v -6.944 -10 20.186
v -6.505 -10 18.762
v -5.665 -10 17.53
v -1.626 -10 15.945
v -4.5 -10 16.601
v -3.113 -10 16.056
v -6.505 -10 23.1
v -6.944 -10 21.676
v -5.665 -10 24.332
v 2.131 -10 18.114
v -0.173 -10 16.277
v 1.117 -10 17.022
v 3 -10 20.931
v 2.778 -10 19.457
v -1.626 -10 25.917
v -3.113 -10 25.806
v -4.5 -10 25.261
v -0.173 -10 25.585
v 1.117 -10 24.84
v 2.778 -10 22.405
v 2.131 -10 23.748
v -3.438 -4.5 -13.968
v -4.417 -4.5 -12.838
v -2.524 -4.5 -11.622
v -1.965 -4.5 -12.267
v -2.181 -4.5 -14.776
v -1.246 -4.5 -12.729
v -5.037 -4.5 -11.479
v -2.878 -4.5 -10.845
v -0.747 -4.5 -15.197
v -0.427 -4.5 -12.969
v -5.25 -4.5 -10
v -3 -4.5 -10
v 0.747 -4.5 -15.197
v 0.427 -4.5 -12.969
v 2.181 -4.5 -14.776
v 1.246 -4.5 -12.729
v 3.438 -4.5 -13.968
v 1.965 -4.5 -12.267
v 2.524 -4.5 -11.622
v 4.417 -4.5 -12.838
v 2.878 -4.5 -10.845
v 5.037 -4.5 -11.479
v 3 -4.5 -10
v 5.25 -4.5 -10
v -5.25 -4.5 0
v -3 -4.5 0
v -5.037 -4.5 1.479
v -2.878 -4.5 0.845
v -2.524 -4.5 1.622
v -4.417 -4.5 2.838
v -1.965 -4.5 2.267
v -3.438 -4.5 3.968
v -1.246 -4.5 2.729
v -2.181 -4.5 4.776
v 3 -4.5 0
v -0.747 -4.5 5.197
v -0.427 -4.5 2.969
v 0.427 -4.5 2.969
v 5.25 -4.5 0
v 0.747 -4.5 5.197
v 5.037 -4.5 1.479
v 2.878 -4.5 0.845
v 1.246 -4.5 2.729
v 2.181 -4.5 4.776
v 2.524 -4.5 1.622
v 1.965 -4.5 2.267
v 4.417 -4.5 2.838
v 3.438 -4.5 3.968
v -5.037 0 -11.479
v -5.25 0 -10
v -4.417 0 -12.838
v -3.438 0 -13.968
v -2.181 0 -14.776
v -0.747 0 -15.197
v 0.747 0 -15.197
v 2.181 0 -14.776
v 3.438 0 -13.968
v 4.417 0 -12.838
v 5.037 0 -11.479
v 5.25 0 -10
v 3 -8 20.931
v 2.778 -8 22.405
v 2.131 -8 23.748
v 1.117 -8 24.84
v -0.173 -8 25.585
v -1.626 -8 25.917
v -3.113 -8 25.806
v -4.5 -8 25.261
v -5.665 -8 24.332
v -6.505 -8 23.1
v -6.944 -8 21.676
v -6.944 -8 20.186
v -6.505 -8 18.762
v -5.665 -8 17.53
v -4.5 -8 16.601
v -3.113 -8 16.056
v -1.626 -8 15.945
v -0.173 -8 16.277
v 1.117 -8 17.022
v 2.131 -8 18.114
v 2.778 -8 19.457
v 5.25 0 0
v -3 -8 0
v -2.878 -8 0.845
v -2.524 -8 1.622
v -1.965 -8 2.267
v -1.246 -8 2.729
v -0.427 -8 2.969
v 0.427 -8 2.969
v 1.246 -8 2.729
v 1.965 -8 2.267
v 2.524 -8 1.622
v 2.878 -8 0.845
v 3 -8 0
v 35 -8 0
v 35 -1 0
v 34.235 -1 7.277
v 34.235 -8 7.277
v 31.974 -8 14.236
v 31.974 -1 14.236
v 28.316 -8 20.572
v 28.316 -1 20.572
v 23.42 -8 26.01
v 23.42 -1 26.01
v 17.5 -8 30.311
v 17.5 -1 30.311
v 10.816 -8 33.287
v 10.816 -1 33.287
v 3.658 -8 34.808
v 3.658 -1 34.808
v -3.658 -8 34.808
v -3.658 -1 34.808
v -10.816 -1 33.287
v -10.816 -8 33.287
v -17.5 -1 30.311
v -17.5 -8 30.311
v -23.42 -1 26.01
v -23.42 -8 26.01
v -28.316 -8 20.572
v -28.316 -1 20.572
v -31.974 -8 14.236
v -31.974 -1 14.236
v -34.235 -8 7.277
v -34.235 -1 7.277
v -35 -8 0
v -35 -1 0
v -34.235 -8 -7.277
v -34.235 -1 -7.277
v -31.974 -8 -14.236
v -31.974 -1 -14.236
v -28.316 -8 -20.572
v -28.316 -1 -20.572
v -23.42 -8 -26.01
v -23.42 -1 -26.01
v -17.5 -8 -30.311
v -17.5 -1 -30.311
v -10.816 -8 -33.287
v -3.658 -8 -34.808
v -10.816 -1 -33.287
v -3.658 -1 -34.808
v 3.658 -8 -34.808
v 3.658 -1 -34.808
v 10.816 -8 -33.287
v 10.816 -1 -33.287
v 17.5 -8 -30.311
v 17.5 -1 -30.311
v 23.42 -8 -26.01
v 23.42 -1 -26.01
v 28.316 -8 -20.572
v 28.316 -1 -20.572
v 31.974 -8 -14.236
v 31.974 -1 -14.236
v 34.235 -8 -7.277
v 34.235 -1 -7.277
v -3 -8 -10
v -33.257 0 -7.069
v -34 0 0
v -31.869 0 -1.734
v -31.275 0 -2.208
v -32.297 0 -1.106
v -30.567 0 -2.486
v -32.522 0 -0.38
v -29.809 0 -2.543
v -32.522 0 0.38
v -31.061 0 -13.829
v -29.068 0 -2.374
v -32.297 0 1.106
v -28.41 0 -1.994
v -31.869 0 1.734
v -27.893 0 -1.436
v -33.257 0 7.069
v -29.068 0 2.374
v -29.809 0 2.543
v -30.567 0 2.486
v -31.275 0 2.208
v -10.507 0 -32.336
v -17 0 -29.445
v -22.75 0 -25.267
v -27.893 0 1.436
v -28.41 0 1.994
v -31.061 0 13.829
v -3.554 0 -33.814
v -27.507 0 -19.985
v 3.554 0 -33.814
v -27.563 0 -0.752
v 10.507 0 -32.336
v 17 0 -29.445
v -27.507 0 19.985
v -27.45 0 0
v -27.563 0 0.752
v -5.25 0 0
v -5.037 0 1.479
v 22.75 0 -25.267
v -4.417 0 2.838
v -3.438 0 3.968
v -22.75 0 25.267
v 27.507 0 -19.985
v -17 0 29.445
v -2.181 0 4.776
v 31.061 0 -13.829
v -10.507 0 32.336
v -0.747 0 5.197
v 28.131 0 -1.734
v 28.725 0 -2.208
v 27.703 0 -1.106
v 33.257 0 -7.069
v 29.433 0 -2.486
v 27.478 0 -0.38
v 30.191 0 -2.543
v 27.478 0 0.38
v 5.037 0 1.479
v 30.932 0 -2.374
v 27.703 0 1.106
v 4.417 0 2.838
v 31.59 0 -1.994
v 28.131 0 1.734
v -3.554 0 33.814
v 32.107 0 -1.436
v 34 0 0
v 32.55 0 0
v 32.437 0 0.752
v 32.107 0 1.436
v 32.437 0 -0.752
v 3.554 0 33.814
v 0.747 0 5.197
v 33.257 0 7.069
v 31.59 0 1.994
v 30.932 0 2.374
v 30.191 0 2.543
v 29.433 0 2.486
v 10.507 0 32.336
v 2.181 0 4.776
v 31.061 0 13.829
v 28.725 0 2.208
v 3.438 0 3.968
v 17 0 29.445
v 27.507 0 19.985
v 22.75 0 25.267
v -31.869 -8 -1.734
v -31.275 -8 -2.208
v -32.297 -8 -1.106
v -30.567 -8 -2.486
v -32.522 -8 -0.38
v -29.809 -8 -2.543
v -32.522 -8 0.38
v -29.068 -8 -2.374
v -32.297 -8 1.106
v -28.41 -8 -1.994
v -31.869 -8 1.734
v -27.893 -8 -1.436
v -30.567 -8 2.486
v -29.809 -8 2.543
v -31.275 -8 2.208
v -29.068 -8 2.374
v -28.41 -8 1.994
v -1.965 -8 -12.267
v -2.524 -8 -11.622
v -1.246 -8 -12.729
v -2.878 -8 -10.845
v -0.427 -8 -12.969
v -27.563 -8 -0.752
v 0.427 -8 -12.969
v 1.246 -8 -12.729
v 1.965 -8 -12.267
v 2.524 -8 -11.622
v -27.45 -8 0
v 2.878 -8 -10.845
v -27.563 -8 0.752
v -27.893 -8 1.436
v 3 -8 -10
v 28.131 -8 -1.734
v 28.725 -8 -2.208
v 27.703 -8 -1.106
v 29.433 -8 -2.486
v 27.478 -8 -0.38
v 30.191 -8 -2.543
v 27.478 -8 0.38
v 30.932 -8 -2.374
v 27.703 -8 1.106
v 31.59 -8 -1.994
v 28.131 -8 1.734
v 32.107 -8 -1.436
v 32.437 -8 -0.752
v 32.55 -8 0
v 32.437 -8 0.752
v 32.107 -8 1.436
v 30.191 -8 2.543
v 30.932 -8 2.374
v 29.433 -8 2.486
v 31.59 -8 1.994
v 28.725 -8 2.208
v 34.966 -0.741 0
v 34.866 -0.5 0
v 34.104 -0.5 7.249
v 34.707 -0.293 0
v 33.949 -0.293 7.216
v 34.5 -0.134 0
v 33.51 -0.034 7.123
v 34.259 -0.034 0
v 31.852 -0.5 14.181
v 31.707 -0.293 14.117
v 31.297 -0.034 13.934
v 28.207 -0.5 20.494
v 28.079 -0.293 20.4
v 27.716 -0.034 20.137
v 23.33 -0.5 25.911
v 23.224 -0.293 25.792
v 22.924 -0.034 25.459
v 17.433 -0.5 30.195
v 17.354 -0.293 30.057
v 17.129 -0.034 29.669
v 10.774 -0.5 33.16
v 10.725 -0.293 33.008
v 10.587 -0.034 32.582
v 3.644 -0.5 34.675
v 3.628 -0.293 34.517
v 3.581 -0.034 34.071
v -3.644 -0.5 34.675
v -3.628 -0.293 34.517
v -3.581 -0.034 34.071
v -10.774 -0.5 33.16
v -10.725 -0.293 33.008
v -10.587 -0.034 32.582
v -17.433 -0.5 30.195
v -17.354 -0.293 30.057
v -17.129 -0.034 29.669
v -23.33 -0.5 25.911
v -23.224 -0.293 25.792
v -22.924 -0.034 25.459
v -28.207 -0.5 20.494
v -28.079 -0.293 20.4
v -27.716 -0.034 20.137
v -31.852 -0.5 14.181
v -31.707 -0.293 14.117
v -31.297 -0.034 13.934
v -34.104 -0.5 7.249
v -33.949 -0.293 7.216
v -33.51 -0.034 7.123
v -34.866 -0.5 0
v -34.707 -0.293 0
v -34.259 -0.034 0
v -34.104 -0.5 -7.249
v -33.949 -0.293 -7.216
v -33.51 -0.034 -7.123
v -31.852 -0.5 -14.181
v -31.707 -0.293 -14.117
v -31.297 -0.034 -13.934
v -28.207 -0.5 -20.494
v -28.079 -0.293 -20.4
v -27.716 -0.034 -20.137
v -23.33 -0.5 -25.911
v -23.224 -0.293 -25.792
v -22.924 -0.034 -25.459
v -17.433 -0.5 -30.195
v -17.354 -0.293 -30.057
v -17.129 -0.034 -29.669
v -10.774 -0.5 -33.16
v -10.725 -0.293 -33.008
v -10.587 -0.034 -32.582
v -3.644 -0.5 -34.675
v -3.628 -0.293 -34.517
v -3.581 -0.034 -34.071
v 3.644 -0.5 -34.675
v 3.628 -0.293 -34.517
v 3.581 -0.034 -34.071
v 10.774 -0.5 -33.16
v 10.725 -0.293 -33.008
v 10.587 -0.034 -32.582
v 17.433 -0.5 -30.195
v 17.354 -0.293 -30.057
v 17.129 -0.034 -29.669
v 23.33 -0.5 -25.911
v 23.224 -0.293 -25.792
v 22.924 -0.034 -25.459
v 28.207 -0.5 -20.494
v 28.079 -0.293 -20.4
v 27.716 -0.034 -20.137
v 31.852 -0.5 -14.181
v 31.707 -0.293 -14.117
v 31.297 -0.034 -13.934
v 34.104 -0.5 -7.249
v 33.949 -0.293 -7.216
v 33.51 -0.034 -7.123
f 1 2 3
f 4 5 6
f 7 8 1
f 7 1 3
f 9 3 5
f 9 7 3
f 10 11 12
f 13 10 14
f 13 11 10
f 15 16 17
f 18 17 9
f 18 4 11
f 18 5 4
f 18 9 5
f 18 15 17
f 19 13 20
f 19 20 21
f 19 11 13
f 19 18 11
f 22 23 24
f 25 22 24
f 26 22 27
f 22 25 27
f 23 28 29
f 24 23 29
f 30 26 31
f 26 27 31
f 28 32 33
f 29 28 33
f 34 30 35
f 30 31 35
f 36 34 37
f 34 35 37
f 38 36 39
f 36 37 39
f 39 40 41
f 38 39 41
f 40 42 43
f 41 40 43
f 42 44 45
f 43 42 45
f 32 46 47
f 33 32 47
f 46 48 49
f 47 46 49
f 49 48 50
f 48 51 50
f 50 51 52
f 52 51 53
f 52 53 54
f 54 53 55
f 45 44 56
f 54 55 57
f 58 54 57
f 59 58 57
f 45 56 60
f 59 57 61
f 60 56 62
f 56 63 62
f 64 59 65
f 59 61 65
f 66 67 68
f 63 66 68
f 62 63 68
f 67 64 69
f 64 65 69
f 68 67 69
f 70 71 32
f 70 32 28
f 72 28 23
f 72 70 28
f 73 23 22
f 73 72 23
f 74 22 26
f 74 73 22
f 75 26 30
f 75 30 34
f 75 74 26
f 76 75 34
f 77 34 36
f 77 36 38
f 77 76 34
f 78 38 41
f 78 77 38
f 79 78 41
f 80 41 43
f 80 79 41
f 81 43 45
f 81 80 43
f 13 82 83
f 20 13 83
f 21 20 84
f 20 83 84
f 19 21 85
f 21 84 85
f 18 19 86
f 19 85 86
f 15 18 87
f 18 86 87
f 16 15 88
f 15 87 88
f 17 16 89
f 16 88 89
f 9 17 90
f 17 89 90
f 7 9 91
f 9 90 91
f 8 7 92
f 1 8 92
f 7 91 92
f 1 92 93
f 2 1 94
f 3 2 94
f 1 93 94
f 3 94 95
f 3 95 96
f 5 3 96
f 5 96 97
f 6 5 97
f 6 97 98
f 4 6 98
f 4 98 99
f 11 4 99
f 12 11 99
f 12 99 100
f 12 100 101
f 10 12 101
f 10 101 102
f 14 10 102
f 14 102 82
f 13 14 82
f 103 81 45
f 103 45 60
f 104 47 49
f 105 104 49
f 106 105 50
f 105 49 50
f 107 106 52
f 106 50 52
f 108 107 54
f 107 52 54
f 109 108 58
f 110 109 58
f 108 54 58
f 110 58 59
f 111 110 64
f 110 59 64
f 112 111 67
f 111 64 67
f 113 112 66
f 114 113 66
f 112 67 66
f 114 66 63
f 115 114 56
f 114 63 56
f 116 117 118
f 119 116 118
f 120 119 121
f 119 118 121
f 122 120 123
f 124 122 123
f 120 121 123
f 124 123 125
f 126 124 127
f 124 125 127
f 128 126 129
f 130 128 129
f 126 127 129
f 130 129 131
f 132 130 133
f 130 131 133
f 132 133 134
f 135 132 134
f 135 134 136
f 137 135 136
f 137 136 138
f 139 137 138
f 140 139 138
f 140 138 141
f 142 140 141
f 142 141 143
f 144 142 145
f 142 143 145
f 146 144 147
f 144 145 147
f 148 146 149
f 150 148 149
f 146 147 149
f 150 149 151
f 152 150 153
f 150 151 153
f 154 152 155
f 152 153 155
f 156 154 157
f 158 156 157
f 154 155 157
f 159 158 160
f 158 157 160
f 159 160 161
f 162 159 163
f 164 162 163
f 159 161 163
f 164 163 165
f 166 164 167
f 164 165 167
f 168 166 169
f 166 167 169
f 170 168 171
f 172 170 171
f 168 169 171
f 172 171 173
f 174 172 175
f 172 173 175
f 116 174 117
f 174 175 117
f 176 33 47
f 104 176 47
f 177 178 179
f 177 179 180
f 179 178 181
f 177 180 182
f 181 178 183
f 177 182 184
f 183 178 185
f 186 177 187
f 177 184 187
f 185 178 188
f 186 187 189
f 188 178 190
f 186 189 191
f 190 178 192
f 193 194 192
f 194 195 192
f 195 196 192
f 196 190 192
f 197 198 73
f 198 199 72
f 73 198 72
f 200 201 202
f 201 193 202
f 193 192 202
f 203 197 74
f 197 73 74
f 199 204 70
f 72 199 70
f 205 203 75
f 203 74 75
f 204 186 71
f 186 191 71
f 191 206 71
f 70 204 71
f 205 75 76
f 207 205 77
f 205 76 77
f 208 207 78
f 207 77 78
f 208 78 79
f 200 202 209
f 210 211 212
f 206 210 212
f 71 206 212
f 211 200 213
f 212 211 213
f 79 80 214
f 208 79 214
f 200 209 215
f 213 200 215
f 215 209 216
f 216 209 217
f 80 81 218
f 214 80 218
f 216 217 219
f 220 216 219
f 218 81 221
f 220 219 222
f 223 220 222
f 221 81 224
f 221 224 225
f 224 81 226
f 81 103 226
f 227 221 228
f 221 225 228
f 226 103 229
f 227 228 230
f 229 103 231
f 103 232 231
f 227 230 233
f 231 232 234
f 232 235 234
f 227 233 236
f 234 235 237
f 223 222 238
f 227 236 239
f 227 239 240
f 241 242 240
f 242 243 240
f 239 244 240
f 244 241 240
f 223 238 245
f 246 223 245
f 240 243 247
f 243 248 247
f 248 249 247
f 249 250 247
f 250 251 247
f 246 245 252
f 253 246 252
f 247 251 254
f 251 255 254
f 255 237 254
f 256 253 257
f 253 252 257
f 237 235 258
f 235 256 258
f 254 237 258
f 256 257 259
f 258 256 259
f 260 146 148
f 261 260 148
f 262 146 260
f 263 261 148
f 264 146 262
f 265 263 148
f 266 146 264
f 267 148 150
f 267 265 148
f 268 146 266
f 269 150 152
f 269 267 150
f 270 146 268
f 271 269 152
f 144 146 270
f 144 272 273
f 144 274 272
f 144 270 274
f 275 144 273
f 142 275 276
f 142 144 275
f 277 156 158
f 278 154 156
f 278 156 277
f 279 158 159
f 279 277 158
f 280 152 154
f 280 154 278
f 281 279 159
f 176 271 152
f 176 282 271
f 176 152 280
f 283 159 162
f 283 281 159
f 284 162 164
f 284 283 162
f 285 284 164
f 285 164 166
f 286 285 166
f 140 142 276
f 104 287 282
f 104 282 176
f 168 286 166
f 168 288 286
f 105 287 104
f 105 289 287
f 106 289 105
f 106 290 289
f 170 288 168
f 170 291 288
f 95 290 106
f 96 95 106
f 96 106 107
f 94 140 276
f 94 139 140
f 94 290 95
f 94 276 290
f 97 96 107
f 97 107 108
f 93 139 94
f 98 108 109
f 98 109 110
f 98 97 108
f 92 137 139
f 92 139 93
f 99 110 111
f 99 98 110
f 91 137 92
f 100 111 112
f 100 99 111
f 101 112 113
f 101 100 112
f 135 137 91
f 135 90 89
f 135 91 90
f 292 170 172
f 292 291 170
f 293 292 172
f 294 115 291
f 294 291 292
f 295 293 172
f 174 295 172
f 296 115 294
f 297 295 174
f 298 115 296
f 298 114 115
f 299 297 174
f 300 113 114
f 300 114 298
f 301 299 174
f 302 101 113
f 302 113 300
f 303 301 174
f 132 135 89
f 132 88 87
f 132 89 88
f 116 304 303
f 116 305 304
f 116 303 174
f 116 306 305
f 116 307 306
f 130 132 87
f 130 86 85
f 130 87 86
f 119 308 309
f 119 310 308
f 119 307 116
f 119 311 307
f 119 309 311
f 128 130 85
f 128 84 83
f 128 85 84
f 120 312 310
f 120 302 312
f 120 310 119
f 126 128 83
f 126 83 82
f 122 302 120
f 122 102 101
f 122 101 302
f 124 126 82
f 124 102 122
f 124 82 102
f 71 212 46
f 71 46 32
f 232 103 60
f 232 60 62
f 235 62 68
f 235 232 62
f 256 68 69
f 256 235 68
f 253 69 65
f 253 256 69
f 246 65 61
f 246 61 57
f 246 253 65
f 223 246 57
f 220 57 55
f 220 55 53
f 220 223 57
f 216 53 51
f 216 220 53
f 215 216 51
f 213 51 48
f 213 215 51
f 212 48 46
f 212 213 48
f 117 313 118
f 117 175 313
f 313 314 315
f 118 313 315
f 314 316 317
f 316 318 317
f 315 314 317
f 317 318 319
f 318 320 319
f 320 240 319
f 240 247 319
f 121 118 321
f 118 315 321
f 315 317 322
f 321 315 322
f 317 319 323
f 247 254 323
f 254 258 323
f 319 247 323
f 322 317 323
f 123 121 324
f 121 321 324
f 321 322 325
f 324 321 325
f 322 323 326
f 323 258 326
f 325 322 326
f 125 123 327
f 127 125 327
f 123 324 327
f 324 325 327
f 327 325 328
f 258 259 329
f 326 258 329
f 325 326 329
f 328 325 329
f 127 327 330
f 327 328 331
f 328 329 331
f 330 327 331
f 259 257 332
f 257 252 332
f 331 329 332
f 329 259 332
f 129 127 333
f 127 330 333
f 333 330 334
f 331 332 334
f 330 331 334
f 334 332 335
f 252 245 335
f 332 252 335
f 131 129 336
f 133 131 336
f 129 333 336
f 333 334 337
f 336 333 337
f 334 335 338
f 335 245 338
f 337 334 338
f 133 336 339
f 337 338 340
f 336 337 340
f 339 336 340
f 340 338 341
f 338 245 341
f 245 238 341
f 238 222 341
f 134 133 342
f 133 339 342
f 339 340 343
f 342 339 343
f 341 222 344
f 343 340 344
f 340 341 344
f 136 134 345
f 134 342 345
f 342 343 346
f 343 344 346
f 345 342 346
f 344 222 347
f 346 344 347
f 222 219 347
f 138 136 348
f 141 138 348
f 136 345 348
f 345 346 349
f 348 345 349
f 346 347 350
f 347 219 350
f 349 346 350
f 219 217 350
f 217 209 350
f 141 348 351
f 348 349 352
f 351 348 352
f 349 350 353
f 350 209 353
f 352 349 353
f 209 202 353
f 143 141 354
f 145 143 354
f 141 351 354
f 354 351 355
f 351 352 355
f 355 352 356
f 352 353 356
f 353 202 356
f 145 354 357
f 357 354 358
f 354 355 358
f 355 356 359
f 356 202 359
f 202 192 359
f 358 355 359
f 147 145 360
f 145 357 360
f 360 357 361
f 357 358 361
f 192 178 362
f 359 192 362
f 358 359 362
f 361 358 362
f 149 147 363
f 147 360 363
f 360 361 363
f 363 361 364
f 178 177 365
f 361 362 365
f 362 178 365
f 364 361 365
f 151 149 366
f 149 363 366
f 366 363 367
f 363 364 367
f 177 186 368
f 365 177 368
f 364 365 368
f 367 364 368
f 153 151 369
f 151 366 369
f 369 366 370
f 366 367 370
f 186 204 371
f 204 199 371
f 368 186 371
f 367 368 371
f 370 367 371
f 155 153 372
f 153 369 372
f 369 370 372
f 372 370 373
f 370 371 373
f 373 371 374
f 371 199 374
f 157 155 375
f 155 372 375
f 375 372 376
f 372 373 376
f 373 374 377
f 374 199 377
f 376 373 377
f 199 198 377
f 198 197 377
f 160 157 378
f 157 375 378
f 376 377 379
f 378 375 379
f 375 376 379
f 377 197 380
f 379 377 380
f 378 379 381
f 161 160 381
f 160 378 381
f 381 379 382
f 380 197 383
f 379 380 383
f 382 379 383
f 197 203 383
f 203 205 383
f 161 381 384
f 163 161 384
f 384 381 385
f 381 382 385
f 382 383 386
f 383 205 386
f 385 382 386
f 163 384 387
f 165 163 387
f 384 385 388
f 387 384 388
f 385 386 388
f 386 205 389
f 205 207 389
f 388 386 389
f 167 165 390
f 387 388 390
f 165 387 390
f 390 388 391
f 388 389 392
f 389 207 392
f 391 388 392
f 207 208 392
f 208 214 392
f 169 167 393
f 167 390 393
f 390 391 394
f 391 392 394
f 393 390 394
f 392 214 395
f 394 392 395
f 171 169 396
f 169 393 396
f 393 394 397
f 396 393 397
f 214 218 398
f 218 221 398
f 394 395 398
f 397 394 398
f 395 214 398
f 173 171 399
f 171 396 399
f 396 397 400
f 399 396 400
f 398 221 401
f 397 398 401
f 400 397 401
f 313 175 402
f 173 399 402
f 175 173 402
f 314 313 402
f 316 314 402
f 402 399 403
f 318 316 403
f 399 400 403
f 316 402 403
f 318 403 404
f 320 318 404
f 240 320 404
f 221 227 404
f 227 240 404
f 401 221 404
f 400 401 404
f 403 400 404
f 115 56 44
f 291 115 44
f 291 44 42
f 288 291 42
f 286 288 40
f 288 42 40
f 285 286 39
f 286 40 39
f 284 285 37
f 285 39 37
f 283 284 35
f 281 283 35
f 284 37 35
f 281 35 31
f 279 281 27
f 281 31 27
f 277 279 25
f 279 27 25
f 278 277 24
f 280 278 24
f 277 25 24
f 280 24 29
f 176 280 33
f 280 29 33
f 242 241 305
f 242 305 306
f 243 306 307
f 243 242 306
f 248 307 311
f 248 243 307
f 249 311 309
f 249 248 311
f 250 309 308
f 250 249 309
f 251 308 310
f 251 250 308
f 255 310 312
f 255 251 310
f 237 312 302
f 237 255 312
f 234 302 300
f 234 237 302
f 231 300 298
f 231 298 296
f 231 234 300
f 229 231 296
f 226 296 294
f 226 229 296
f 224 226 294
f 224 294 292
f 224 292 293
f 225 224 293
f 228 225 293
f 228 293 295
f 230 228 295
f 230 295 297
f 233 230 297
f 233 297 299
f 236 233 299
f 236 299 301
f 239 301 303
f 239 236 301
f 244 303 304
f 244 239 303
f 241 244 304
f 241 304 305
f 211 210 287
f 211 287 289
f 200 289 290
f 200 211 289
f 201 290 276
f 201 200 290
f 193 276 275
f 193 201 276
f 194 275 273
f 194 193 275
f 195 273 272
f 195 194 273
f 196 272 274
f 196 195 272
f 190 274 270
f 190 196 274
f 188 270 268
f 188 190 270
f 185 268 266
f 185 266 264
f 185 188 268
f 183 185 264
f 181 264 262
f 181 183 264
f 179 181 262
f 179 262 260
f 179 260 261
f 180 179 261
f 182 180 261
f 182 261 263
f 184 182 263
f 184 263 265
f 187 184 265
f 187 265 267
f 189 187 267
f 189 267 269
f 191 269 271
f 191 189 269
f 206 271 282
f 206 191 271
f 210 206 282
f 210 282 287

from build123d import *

# Parameters (mm, degrees)
F0_R     = 35
F0_R_2   = 2.55
F0_R_3   = 5
F1_DEPTH = 8
F2_DEPTH = 8
F3_DEPTH = 4.5
F4_R     = 1
F5_DEPTH = 10


with BuildPart() as f1:
    # F0 (on Front) → F1 (new body)
    with BuildSketch(Plane.XZ):
        Circle(F0_R)
        with BuildLine():
            ThreePointArc((-5.25, 0), (0, 5.25), (5.25, 0))
            Line((5.25, 0), (5.25, -10))
            ThreePointArc((5.25, -10), (0, -15.25), (-5.25, -10))
            Line((-5.25, -10), (-5.25, 0))
        make_face(mode=Mode.SUBTRACT)
        with Locations((-30, 0)):
            Circle(F0_R_2, mode=Mode.SUBTRACT)
        with Locations((-2, 20.93092)):
            Circle(F0_R_3, mode=Mode.SUBTRACT)
        with Locations((30, 0)):
            Circle(F0_R_2, mode=Mode.SUBTRACT)
    extrude(amount=F1_DEPTH)

    # F0 (on Front) → F2 (join)
    with BuildSketch(Plane.XZ):
        with BuildLine():
            Line((5.25, -10), (5.25, 0))
            ThreePointArc((5.25, 0), (0, 5.25), (-5.25, 0))
            Line((-5.25, 0), (-5.25, -10))
            ThreePointArc((-5.25, -10), (0, -15.25), (5.25, -10))
        make_face()
        with BuildLine():
            ThreePointArc((-3, 0), (0, 3), (3, 0))
            Line((3, 0), (3, -10))
            ThreePointArc((3, -10), (0, -13), (-3, -10))
            Line((-3, -10), (-3, 0))
        make_face(mode=Mode.SUBTRACT)
    extrude(amount=F2_DEPTH)

    # F0 (on Front) → F3 (cut)
    with BuildSketch(Plane.XZ):
        with BuildLine():
            Line((5.25, -10), (5.25, 0))
            ThreePointArc((5.25, 0), (0, 5.25), (-5.25, 0))
            Line((-5.25, 0), (-5.25, -10))
            ThreePointArc((-5.25, -10), (0, -15.25), (5.25, -10))
        make_face()
        with BuildLine():
            ThreePointArc((-3, 0), (0, 3), (3, 0))
            Line((3, 0), (3, -10))
            ThreePointArc((3, -10), (0, -13), (-3, -10))
            Line((-3, -10), (-3, 0))
        make_face(mode=Mode.SUBTRACT)
    extrude(amount=F3_DEPTH, mode=Mode.SUBTRACT)

    # F4
    f4_edges = [f1.edges().sort_by_distance(p)[0] for p in [
        (-35, 0, 0),
    ]]
    fillet(f4_edges, radius=F4_R)

    # F0 (on Front) → F5 (join)
    with BuildSketch(Plane.XZ):
        with Locations((-2, 20.93092)):
            Circle(F0_R_3)
    extrude(amount=F5_DEPTH)


solid = f1.part
